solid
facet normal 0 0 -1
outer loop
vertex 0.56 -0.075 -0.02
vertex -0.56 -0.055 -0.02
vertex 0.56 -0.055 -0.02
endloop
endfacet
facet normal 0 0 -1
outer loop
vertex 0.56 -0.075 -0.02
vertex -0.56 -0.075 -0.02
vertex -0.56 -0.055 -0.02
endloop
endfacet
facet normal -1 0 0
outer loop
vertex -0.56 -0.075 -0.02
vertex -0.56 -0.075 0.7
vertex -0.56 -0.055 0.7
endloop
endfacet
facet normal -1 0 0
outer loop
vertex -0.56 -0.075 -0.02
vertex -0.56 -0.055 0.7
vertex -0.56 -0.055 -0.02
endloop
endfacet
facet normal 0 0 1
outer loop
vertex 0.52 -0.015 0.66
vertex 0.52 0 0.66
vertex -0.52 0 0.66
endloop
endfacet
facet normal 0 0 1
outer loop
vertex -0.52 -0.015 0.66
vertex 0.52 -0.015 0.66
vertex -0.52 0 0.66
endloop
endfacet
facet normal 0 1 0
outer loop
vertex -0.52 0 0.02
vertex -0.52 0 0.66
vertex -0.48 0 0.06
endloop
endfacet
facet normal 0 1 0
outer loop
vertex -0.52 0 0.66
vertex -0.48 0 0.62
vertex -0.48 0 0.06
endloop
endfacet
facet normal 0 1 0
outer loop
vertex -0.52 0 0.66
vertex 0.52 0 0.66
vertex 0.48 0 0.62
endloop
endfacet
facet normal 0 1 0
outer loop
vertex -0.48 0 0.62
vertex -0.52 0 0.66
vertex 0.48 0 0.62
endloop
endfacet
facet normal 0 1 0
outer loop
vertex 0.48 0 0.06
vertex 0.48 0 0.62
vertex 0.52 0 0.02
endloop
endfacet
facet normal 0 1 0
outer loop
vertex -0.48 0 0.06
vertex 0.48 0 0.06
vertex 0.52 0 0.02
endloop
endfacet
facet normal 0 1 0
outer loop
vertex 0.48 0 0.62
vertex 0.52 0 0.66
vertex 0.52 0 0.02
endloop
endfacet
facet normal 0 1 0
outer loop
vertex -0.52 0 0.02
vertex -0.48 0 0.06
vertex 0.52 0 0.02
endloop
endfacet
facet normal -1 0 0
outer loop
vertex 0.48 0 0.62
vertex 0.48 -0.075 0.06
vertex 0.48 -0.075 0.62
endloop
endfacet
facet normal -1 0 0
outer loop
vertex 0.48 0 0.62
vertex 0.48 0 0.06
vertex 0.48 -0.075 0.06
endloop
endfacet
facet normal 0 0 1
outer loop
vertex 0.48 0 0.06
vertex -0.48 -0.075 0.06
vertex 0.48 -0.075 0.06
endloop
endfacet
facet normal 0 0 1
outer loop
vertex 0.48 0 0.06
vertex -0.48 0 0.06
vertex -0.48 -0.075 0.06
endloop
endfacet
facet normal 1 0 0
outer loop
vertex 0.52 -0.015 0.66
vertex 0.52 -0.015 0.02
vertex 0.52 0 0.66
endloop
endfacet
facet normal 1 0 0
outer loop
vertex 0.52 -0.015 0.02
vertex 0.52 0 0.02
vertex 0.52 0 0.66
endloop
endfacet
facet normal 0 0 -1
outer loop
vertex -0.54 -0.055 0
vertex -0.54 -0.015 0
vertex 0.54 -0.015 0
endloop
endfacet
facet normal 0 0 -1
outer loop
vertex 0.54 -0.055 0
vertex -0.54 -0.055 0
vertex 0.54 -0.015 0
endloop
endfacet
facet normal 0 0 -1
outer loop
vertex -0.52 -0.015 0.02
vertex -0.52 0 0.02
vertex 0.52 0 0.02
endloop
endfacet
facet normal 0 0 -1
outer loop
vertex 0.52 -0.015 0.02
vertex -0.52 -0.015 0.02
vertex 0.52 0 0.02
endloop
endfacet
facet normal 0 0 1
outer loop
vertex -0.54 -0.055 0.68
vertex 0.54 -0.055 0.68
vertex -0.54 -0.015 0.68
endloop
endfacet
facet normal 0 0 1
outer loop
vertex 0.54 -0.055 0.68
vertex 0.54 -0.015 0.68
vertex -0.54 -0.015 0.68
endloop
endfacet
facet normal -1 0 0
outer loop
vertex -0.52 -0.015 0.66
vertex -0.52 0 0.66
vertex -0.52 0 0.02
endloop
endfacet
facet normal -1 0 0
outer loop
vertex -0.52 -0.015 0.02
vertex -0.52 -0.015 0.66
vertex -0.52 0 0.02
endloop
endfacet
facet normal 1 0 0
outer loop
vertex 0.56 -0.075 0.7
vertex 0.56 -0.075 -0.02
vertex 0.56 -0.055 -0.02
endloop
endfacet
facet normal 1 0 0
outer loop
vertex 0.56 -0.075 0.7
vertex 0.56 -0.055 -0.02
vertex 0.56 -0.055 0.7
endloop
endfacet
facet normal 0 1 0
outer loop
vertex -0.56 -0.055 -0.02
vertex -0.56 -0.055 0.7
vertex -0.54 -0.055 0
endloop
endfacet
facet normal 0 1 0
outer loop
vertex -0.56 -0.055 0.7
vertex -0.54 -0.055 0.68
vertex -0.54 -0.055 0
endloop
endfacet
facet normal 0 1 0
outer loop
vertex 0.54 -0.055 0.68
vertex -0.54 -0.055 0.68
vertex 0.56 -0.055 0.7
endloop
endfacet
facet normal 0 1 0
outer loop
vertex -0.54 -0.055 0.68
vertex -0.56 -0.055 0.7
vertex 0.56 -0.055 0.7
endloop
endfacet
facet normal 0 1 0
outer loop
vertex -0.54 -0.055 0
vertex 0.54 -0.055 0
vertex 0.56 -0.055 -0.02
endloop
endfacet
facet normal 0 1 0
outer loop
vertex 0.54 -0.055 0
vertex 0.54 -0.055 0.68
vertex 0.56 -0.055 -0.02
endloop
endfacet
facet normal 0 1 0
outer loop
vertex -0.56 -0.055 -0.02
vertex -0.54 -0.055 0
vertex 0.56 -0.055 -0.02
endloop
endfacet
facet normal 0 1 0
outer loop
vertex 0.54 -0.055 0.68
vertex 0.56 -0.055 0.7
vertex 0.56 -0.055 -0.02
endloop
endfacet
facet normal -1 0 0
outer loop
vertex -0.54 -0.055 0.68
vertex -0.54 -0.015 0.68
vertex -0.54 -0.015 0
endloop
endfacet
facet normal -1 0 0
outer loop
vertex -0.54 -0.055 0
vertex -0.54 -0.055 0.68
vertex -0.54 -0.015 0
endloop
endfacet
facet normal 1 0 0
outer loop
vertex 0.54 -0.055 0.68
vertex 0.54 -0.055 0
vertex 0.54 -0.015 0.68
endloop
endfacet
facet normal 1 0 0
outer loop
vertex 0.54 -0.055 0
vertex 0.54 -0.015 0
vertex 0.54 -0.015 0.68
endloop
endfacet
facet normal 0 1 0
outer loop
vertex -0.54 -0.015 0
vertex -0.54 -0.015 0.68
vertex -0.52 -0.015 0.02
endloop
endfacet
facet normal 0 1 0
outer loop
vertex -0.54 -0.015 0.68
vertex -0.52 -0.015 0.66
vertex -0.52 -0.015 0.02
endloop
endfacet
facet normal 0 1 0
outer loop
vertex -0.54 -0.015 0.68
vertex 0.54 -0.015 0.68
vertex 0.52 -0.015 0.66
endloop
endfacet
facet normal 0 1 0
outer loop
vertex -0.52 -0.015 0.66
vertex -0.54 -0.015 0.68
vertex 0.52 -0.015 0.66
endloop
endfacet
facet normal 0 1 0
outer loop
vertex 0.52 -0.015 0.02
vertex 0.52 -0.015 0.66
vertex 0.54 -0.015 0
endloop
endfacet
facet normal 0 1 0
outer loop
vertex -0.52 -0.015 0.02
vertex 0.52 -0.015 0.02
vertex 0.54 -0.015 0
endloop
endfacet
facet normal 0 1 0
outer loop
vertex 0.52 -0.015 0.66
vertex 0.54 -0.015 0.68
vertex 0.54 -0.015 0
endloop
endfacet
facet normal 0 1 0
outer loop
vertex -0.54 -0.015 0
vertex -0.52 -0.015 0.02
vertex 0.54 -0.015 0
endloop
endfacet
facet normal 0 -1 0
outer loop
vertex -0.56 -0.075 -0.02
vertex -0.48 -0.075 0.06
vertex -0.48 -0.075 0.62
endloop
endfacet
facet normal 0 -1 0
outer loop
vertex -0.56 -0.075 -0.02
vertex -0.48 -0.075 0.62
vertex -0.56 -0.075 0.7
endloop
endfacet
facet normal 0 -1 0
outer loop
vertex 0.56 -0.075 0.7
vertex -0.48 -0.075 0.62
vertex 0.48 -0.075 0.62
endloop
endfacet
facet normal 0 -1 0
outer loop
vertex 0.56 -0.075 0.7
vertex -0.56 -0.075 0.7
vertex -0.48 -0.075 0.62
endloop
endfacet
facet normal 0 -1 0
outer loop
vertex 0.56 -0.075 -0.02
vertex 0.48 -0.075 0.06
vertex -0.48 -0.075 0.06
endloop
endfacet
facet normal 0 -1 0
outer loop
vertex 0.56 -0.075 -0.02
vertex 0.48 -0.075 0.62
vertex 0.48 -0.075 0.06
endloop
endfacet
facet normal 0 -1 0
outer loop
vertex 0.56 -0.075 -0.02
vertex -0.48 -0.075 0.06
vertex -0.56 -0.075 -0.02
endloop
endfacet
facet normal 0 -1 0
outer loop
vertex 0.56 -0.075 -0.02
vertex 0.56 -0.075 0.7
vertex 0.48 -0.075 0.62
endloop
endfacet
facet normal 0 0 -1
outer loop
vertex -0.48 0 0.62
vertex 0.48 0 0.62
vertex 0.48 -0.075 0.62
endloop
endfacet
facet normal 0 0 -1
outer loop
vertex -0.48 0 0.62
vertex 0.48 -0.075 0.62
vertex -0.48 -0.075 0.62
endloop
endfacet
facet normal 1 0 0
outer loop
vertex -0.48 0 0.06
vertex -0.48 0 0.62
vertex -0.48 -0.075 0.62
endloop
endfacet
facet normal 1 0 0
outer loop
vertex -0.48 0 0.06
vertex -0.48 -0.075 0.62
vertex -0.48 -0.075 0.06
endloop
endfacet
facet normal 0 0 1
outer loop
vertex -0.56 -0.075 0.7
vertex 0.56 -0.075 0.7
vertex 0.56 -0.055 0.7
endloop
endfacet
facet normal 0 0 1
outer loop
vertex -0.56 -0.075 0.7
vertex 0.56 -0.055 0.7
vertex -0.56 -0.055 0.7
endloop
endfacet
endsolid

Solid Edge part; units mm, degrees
sketch "Sketch1" plane through (0, 0, 0) normal (0, -1, 0) x (1, 0, 0)
  line L0 (-0.54, 0) -> (0.54, 0)
  line L1 (0.54, 0) -> (0.54, 0.68)
  line L2 (0.54, 0.68) -> (-0.54, 0.68)
  line L3 (-0.54, 0.68) -> (-0.54, 0)
  dimension "D1" = 0.68
  dimension "D2" = 1.08
extrude "Protrusion1" add sketch "Sketch1" along normal blind 0.075
sketch "Sketch2" plane through (0, 0, 0.69) normal (0, 1, 0) x (-1, 0, 0)
  line L0 (-0.48, -0.07) -> (0.48, -0.07)
  line L1 (0.48, -0.07) -> (0.48, -0.63)
  line L2 (0.48, -0.63) -> (-0.48, -0.63)
  line L3 (-0.48, -0.63) -> (-0.48, -0.07)
extrude "Cutout1" cut sketch "Sketch2" against normal up to next
sketch "Sketch3" plane through (0, 0, 0.69) normal (0, 1, 0) x (-1, 0, 0)
  line L0 (-0.52, -0.67) -> (-0.52, -0.03)
  line L1 (-0.52, -0.03) -> (0.52, -0.03)
  line L2 (0.52, -0.03) -> (0.52, -0.67)
  line L3 (0.52, -0.67) -> (-0.52, -0.67)
  line L4 (-0.54, -0.69) -> (-0.54, -0.01)
  line L5 (-0.54, -0.01) -> (0.54, -0.01)
  line L6 (0.54, -0.01) -> (0.54, -0.69)
  line L7 (0.54, -0.69) -> (-0.54, -0.69)
extrude "Ausschnitt_1" cut sketch "Sketch3" against normal blind 0.015
sketch "Sketch4" plane through (0, -0.075, 0.69) normal (0, -1, 0) x (1, 0, 0)
  line L0 (-0.56, 0.01) -> (-0.56, -0.71)
  line L1 (-0.56, -0.71) -> (0.56, -0.71)
  line L2 (0.56, -0.71) -> (0.56, 0.01)
  line L3 (0.56, 0.01) -> (-0.56, 0.01)
  line L4 (0.54, -0.01) -> (-0.54, -0.01)
  line L5 (-0.54, -0.01) -> (-0.54, -0.69)
  line L6 (-0.54, -0.69) -> (0.54, -0.69)
  line L7 (0.54, -0.69) -> (0.54, -0.01)
extrude "Ausprägung_2" add sketch "Sketch4" against normal blind 0.02
